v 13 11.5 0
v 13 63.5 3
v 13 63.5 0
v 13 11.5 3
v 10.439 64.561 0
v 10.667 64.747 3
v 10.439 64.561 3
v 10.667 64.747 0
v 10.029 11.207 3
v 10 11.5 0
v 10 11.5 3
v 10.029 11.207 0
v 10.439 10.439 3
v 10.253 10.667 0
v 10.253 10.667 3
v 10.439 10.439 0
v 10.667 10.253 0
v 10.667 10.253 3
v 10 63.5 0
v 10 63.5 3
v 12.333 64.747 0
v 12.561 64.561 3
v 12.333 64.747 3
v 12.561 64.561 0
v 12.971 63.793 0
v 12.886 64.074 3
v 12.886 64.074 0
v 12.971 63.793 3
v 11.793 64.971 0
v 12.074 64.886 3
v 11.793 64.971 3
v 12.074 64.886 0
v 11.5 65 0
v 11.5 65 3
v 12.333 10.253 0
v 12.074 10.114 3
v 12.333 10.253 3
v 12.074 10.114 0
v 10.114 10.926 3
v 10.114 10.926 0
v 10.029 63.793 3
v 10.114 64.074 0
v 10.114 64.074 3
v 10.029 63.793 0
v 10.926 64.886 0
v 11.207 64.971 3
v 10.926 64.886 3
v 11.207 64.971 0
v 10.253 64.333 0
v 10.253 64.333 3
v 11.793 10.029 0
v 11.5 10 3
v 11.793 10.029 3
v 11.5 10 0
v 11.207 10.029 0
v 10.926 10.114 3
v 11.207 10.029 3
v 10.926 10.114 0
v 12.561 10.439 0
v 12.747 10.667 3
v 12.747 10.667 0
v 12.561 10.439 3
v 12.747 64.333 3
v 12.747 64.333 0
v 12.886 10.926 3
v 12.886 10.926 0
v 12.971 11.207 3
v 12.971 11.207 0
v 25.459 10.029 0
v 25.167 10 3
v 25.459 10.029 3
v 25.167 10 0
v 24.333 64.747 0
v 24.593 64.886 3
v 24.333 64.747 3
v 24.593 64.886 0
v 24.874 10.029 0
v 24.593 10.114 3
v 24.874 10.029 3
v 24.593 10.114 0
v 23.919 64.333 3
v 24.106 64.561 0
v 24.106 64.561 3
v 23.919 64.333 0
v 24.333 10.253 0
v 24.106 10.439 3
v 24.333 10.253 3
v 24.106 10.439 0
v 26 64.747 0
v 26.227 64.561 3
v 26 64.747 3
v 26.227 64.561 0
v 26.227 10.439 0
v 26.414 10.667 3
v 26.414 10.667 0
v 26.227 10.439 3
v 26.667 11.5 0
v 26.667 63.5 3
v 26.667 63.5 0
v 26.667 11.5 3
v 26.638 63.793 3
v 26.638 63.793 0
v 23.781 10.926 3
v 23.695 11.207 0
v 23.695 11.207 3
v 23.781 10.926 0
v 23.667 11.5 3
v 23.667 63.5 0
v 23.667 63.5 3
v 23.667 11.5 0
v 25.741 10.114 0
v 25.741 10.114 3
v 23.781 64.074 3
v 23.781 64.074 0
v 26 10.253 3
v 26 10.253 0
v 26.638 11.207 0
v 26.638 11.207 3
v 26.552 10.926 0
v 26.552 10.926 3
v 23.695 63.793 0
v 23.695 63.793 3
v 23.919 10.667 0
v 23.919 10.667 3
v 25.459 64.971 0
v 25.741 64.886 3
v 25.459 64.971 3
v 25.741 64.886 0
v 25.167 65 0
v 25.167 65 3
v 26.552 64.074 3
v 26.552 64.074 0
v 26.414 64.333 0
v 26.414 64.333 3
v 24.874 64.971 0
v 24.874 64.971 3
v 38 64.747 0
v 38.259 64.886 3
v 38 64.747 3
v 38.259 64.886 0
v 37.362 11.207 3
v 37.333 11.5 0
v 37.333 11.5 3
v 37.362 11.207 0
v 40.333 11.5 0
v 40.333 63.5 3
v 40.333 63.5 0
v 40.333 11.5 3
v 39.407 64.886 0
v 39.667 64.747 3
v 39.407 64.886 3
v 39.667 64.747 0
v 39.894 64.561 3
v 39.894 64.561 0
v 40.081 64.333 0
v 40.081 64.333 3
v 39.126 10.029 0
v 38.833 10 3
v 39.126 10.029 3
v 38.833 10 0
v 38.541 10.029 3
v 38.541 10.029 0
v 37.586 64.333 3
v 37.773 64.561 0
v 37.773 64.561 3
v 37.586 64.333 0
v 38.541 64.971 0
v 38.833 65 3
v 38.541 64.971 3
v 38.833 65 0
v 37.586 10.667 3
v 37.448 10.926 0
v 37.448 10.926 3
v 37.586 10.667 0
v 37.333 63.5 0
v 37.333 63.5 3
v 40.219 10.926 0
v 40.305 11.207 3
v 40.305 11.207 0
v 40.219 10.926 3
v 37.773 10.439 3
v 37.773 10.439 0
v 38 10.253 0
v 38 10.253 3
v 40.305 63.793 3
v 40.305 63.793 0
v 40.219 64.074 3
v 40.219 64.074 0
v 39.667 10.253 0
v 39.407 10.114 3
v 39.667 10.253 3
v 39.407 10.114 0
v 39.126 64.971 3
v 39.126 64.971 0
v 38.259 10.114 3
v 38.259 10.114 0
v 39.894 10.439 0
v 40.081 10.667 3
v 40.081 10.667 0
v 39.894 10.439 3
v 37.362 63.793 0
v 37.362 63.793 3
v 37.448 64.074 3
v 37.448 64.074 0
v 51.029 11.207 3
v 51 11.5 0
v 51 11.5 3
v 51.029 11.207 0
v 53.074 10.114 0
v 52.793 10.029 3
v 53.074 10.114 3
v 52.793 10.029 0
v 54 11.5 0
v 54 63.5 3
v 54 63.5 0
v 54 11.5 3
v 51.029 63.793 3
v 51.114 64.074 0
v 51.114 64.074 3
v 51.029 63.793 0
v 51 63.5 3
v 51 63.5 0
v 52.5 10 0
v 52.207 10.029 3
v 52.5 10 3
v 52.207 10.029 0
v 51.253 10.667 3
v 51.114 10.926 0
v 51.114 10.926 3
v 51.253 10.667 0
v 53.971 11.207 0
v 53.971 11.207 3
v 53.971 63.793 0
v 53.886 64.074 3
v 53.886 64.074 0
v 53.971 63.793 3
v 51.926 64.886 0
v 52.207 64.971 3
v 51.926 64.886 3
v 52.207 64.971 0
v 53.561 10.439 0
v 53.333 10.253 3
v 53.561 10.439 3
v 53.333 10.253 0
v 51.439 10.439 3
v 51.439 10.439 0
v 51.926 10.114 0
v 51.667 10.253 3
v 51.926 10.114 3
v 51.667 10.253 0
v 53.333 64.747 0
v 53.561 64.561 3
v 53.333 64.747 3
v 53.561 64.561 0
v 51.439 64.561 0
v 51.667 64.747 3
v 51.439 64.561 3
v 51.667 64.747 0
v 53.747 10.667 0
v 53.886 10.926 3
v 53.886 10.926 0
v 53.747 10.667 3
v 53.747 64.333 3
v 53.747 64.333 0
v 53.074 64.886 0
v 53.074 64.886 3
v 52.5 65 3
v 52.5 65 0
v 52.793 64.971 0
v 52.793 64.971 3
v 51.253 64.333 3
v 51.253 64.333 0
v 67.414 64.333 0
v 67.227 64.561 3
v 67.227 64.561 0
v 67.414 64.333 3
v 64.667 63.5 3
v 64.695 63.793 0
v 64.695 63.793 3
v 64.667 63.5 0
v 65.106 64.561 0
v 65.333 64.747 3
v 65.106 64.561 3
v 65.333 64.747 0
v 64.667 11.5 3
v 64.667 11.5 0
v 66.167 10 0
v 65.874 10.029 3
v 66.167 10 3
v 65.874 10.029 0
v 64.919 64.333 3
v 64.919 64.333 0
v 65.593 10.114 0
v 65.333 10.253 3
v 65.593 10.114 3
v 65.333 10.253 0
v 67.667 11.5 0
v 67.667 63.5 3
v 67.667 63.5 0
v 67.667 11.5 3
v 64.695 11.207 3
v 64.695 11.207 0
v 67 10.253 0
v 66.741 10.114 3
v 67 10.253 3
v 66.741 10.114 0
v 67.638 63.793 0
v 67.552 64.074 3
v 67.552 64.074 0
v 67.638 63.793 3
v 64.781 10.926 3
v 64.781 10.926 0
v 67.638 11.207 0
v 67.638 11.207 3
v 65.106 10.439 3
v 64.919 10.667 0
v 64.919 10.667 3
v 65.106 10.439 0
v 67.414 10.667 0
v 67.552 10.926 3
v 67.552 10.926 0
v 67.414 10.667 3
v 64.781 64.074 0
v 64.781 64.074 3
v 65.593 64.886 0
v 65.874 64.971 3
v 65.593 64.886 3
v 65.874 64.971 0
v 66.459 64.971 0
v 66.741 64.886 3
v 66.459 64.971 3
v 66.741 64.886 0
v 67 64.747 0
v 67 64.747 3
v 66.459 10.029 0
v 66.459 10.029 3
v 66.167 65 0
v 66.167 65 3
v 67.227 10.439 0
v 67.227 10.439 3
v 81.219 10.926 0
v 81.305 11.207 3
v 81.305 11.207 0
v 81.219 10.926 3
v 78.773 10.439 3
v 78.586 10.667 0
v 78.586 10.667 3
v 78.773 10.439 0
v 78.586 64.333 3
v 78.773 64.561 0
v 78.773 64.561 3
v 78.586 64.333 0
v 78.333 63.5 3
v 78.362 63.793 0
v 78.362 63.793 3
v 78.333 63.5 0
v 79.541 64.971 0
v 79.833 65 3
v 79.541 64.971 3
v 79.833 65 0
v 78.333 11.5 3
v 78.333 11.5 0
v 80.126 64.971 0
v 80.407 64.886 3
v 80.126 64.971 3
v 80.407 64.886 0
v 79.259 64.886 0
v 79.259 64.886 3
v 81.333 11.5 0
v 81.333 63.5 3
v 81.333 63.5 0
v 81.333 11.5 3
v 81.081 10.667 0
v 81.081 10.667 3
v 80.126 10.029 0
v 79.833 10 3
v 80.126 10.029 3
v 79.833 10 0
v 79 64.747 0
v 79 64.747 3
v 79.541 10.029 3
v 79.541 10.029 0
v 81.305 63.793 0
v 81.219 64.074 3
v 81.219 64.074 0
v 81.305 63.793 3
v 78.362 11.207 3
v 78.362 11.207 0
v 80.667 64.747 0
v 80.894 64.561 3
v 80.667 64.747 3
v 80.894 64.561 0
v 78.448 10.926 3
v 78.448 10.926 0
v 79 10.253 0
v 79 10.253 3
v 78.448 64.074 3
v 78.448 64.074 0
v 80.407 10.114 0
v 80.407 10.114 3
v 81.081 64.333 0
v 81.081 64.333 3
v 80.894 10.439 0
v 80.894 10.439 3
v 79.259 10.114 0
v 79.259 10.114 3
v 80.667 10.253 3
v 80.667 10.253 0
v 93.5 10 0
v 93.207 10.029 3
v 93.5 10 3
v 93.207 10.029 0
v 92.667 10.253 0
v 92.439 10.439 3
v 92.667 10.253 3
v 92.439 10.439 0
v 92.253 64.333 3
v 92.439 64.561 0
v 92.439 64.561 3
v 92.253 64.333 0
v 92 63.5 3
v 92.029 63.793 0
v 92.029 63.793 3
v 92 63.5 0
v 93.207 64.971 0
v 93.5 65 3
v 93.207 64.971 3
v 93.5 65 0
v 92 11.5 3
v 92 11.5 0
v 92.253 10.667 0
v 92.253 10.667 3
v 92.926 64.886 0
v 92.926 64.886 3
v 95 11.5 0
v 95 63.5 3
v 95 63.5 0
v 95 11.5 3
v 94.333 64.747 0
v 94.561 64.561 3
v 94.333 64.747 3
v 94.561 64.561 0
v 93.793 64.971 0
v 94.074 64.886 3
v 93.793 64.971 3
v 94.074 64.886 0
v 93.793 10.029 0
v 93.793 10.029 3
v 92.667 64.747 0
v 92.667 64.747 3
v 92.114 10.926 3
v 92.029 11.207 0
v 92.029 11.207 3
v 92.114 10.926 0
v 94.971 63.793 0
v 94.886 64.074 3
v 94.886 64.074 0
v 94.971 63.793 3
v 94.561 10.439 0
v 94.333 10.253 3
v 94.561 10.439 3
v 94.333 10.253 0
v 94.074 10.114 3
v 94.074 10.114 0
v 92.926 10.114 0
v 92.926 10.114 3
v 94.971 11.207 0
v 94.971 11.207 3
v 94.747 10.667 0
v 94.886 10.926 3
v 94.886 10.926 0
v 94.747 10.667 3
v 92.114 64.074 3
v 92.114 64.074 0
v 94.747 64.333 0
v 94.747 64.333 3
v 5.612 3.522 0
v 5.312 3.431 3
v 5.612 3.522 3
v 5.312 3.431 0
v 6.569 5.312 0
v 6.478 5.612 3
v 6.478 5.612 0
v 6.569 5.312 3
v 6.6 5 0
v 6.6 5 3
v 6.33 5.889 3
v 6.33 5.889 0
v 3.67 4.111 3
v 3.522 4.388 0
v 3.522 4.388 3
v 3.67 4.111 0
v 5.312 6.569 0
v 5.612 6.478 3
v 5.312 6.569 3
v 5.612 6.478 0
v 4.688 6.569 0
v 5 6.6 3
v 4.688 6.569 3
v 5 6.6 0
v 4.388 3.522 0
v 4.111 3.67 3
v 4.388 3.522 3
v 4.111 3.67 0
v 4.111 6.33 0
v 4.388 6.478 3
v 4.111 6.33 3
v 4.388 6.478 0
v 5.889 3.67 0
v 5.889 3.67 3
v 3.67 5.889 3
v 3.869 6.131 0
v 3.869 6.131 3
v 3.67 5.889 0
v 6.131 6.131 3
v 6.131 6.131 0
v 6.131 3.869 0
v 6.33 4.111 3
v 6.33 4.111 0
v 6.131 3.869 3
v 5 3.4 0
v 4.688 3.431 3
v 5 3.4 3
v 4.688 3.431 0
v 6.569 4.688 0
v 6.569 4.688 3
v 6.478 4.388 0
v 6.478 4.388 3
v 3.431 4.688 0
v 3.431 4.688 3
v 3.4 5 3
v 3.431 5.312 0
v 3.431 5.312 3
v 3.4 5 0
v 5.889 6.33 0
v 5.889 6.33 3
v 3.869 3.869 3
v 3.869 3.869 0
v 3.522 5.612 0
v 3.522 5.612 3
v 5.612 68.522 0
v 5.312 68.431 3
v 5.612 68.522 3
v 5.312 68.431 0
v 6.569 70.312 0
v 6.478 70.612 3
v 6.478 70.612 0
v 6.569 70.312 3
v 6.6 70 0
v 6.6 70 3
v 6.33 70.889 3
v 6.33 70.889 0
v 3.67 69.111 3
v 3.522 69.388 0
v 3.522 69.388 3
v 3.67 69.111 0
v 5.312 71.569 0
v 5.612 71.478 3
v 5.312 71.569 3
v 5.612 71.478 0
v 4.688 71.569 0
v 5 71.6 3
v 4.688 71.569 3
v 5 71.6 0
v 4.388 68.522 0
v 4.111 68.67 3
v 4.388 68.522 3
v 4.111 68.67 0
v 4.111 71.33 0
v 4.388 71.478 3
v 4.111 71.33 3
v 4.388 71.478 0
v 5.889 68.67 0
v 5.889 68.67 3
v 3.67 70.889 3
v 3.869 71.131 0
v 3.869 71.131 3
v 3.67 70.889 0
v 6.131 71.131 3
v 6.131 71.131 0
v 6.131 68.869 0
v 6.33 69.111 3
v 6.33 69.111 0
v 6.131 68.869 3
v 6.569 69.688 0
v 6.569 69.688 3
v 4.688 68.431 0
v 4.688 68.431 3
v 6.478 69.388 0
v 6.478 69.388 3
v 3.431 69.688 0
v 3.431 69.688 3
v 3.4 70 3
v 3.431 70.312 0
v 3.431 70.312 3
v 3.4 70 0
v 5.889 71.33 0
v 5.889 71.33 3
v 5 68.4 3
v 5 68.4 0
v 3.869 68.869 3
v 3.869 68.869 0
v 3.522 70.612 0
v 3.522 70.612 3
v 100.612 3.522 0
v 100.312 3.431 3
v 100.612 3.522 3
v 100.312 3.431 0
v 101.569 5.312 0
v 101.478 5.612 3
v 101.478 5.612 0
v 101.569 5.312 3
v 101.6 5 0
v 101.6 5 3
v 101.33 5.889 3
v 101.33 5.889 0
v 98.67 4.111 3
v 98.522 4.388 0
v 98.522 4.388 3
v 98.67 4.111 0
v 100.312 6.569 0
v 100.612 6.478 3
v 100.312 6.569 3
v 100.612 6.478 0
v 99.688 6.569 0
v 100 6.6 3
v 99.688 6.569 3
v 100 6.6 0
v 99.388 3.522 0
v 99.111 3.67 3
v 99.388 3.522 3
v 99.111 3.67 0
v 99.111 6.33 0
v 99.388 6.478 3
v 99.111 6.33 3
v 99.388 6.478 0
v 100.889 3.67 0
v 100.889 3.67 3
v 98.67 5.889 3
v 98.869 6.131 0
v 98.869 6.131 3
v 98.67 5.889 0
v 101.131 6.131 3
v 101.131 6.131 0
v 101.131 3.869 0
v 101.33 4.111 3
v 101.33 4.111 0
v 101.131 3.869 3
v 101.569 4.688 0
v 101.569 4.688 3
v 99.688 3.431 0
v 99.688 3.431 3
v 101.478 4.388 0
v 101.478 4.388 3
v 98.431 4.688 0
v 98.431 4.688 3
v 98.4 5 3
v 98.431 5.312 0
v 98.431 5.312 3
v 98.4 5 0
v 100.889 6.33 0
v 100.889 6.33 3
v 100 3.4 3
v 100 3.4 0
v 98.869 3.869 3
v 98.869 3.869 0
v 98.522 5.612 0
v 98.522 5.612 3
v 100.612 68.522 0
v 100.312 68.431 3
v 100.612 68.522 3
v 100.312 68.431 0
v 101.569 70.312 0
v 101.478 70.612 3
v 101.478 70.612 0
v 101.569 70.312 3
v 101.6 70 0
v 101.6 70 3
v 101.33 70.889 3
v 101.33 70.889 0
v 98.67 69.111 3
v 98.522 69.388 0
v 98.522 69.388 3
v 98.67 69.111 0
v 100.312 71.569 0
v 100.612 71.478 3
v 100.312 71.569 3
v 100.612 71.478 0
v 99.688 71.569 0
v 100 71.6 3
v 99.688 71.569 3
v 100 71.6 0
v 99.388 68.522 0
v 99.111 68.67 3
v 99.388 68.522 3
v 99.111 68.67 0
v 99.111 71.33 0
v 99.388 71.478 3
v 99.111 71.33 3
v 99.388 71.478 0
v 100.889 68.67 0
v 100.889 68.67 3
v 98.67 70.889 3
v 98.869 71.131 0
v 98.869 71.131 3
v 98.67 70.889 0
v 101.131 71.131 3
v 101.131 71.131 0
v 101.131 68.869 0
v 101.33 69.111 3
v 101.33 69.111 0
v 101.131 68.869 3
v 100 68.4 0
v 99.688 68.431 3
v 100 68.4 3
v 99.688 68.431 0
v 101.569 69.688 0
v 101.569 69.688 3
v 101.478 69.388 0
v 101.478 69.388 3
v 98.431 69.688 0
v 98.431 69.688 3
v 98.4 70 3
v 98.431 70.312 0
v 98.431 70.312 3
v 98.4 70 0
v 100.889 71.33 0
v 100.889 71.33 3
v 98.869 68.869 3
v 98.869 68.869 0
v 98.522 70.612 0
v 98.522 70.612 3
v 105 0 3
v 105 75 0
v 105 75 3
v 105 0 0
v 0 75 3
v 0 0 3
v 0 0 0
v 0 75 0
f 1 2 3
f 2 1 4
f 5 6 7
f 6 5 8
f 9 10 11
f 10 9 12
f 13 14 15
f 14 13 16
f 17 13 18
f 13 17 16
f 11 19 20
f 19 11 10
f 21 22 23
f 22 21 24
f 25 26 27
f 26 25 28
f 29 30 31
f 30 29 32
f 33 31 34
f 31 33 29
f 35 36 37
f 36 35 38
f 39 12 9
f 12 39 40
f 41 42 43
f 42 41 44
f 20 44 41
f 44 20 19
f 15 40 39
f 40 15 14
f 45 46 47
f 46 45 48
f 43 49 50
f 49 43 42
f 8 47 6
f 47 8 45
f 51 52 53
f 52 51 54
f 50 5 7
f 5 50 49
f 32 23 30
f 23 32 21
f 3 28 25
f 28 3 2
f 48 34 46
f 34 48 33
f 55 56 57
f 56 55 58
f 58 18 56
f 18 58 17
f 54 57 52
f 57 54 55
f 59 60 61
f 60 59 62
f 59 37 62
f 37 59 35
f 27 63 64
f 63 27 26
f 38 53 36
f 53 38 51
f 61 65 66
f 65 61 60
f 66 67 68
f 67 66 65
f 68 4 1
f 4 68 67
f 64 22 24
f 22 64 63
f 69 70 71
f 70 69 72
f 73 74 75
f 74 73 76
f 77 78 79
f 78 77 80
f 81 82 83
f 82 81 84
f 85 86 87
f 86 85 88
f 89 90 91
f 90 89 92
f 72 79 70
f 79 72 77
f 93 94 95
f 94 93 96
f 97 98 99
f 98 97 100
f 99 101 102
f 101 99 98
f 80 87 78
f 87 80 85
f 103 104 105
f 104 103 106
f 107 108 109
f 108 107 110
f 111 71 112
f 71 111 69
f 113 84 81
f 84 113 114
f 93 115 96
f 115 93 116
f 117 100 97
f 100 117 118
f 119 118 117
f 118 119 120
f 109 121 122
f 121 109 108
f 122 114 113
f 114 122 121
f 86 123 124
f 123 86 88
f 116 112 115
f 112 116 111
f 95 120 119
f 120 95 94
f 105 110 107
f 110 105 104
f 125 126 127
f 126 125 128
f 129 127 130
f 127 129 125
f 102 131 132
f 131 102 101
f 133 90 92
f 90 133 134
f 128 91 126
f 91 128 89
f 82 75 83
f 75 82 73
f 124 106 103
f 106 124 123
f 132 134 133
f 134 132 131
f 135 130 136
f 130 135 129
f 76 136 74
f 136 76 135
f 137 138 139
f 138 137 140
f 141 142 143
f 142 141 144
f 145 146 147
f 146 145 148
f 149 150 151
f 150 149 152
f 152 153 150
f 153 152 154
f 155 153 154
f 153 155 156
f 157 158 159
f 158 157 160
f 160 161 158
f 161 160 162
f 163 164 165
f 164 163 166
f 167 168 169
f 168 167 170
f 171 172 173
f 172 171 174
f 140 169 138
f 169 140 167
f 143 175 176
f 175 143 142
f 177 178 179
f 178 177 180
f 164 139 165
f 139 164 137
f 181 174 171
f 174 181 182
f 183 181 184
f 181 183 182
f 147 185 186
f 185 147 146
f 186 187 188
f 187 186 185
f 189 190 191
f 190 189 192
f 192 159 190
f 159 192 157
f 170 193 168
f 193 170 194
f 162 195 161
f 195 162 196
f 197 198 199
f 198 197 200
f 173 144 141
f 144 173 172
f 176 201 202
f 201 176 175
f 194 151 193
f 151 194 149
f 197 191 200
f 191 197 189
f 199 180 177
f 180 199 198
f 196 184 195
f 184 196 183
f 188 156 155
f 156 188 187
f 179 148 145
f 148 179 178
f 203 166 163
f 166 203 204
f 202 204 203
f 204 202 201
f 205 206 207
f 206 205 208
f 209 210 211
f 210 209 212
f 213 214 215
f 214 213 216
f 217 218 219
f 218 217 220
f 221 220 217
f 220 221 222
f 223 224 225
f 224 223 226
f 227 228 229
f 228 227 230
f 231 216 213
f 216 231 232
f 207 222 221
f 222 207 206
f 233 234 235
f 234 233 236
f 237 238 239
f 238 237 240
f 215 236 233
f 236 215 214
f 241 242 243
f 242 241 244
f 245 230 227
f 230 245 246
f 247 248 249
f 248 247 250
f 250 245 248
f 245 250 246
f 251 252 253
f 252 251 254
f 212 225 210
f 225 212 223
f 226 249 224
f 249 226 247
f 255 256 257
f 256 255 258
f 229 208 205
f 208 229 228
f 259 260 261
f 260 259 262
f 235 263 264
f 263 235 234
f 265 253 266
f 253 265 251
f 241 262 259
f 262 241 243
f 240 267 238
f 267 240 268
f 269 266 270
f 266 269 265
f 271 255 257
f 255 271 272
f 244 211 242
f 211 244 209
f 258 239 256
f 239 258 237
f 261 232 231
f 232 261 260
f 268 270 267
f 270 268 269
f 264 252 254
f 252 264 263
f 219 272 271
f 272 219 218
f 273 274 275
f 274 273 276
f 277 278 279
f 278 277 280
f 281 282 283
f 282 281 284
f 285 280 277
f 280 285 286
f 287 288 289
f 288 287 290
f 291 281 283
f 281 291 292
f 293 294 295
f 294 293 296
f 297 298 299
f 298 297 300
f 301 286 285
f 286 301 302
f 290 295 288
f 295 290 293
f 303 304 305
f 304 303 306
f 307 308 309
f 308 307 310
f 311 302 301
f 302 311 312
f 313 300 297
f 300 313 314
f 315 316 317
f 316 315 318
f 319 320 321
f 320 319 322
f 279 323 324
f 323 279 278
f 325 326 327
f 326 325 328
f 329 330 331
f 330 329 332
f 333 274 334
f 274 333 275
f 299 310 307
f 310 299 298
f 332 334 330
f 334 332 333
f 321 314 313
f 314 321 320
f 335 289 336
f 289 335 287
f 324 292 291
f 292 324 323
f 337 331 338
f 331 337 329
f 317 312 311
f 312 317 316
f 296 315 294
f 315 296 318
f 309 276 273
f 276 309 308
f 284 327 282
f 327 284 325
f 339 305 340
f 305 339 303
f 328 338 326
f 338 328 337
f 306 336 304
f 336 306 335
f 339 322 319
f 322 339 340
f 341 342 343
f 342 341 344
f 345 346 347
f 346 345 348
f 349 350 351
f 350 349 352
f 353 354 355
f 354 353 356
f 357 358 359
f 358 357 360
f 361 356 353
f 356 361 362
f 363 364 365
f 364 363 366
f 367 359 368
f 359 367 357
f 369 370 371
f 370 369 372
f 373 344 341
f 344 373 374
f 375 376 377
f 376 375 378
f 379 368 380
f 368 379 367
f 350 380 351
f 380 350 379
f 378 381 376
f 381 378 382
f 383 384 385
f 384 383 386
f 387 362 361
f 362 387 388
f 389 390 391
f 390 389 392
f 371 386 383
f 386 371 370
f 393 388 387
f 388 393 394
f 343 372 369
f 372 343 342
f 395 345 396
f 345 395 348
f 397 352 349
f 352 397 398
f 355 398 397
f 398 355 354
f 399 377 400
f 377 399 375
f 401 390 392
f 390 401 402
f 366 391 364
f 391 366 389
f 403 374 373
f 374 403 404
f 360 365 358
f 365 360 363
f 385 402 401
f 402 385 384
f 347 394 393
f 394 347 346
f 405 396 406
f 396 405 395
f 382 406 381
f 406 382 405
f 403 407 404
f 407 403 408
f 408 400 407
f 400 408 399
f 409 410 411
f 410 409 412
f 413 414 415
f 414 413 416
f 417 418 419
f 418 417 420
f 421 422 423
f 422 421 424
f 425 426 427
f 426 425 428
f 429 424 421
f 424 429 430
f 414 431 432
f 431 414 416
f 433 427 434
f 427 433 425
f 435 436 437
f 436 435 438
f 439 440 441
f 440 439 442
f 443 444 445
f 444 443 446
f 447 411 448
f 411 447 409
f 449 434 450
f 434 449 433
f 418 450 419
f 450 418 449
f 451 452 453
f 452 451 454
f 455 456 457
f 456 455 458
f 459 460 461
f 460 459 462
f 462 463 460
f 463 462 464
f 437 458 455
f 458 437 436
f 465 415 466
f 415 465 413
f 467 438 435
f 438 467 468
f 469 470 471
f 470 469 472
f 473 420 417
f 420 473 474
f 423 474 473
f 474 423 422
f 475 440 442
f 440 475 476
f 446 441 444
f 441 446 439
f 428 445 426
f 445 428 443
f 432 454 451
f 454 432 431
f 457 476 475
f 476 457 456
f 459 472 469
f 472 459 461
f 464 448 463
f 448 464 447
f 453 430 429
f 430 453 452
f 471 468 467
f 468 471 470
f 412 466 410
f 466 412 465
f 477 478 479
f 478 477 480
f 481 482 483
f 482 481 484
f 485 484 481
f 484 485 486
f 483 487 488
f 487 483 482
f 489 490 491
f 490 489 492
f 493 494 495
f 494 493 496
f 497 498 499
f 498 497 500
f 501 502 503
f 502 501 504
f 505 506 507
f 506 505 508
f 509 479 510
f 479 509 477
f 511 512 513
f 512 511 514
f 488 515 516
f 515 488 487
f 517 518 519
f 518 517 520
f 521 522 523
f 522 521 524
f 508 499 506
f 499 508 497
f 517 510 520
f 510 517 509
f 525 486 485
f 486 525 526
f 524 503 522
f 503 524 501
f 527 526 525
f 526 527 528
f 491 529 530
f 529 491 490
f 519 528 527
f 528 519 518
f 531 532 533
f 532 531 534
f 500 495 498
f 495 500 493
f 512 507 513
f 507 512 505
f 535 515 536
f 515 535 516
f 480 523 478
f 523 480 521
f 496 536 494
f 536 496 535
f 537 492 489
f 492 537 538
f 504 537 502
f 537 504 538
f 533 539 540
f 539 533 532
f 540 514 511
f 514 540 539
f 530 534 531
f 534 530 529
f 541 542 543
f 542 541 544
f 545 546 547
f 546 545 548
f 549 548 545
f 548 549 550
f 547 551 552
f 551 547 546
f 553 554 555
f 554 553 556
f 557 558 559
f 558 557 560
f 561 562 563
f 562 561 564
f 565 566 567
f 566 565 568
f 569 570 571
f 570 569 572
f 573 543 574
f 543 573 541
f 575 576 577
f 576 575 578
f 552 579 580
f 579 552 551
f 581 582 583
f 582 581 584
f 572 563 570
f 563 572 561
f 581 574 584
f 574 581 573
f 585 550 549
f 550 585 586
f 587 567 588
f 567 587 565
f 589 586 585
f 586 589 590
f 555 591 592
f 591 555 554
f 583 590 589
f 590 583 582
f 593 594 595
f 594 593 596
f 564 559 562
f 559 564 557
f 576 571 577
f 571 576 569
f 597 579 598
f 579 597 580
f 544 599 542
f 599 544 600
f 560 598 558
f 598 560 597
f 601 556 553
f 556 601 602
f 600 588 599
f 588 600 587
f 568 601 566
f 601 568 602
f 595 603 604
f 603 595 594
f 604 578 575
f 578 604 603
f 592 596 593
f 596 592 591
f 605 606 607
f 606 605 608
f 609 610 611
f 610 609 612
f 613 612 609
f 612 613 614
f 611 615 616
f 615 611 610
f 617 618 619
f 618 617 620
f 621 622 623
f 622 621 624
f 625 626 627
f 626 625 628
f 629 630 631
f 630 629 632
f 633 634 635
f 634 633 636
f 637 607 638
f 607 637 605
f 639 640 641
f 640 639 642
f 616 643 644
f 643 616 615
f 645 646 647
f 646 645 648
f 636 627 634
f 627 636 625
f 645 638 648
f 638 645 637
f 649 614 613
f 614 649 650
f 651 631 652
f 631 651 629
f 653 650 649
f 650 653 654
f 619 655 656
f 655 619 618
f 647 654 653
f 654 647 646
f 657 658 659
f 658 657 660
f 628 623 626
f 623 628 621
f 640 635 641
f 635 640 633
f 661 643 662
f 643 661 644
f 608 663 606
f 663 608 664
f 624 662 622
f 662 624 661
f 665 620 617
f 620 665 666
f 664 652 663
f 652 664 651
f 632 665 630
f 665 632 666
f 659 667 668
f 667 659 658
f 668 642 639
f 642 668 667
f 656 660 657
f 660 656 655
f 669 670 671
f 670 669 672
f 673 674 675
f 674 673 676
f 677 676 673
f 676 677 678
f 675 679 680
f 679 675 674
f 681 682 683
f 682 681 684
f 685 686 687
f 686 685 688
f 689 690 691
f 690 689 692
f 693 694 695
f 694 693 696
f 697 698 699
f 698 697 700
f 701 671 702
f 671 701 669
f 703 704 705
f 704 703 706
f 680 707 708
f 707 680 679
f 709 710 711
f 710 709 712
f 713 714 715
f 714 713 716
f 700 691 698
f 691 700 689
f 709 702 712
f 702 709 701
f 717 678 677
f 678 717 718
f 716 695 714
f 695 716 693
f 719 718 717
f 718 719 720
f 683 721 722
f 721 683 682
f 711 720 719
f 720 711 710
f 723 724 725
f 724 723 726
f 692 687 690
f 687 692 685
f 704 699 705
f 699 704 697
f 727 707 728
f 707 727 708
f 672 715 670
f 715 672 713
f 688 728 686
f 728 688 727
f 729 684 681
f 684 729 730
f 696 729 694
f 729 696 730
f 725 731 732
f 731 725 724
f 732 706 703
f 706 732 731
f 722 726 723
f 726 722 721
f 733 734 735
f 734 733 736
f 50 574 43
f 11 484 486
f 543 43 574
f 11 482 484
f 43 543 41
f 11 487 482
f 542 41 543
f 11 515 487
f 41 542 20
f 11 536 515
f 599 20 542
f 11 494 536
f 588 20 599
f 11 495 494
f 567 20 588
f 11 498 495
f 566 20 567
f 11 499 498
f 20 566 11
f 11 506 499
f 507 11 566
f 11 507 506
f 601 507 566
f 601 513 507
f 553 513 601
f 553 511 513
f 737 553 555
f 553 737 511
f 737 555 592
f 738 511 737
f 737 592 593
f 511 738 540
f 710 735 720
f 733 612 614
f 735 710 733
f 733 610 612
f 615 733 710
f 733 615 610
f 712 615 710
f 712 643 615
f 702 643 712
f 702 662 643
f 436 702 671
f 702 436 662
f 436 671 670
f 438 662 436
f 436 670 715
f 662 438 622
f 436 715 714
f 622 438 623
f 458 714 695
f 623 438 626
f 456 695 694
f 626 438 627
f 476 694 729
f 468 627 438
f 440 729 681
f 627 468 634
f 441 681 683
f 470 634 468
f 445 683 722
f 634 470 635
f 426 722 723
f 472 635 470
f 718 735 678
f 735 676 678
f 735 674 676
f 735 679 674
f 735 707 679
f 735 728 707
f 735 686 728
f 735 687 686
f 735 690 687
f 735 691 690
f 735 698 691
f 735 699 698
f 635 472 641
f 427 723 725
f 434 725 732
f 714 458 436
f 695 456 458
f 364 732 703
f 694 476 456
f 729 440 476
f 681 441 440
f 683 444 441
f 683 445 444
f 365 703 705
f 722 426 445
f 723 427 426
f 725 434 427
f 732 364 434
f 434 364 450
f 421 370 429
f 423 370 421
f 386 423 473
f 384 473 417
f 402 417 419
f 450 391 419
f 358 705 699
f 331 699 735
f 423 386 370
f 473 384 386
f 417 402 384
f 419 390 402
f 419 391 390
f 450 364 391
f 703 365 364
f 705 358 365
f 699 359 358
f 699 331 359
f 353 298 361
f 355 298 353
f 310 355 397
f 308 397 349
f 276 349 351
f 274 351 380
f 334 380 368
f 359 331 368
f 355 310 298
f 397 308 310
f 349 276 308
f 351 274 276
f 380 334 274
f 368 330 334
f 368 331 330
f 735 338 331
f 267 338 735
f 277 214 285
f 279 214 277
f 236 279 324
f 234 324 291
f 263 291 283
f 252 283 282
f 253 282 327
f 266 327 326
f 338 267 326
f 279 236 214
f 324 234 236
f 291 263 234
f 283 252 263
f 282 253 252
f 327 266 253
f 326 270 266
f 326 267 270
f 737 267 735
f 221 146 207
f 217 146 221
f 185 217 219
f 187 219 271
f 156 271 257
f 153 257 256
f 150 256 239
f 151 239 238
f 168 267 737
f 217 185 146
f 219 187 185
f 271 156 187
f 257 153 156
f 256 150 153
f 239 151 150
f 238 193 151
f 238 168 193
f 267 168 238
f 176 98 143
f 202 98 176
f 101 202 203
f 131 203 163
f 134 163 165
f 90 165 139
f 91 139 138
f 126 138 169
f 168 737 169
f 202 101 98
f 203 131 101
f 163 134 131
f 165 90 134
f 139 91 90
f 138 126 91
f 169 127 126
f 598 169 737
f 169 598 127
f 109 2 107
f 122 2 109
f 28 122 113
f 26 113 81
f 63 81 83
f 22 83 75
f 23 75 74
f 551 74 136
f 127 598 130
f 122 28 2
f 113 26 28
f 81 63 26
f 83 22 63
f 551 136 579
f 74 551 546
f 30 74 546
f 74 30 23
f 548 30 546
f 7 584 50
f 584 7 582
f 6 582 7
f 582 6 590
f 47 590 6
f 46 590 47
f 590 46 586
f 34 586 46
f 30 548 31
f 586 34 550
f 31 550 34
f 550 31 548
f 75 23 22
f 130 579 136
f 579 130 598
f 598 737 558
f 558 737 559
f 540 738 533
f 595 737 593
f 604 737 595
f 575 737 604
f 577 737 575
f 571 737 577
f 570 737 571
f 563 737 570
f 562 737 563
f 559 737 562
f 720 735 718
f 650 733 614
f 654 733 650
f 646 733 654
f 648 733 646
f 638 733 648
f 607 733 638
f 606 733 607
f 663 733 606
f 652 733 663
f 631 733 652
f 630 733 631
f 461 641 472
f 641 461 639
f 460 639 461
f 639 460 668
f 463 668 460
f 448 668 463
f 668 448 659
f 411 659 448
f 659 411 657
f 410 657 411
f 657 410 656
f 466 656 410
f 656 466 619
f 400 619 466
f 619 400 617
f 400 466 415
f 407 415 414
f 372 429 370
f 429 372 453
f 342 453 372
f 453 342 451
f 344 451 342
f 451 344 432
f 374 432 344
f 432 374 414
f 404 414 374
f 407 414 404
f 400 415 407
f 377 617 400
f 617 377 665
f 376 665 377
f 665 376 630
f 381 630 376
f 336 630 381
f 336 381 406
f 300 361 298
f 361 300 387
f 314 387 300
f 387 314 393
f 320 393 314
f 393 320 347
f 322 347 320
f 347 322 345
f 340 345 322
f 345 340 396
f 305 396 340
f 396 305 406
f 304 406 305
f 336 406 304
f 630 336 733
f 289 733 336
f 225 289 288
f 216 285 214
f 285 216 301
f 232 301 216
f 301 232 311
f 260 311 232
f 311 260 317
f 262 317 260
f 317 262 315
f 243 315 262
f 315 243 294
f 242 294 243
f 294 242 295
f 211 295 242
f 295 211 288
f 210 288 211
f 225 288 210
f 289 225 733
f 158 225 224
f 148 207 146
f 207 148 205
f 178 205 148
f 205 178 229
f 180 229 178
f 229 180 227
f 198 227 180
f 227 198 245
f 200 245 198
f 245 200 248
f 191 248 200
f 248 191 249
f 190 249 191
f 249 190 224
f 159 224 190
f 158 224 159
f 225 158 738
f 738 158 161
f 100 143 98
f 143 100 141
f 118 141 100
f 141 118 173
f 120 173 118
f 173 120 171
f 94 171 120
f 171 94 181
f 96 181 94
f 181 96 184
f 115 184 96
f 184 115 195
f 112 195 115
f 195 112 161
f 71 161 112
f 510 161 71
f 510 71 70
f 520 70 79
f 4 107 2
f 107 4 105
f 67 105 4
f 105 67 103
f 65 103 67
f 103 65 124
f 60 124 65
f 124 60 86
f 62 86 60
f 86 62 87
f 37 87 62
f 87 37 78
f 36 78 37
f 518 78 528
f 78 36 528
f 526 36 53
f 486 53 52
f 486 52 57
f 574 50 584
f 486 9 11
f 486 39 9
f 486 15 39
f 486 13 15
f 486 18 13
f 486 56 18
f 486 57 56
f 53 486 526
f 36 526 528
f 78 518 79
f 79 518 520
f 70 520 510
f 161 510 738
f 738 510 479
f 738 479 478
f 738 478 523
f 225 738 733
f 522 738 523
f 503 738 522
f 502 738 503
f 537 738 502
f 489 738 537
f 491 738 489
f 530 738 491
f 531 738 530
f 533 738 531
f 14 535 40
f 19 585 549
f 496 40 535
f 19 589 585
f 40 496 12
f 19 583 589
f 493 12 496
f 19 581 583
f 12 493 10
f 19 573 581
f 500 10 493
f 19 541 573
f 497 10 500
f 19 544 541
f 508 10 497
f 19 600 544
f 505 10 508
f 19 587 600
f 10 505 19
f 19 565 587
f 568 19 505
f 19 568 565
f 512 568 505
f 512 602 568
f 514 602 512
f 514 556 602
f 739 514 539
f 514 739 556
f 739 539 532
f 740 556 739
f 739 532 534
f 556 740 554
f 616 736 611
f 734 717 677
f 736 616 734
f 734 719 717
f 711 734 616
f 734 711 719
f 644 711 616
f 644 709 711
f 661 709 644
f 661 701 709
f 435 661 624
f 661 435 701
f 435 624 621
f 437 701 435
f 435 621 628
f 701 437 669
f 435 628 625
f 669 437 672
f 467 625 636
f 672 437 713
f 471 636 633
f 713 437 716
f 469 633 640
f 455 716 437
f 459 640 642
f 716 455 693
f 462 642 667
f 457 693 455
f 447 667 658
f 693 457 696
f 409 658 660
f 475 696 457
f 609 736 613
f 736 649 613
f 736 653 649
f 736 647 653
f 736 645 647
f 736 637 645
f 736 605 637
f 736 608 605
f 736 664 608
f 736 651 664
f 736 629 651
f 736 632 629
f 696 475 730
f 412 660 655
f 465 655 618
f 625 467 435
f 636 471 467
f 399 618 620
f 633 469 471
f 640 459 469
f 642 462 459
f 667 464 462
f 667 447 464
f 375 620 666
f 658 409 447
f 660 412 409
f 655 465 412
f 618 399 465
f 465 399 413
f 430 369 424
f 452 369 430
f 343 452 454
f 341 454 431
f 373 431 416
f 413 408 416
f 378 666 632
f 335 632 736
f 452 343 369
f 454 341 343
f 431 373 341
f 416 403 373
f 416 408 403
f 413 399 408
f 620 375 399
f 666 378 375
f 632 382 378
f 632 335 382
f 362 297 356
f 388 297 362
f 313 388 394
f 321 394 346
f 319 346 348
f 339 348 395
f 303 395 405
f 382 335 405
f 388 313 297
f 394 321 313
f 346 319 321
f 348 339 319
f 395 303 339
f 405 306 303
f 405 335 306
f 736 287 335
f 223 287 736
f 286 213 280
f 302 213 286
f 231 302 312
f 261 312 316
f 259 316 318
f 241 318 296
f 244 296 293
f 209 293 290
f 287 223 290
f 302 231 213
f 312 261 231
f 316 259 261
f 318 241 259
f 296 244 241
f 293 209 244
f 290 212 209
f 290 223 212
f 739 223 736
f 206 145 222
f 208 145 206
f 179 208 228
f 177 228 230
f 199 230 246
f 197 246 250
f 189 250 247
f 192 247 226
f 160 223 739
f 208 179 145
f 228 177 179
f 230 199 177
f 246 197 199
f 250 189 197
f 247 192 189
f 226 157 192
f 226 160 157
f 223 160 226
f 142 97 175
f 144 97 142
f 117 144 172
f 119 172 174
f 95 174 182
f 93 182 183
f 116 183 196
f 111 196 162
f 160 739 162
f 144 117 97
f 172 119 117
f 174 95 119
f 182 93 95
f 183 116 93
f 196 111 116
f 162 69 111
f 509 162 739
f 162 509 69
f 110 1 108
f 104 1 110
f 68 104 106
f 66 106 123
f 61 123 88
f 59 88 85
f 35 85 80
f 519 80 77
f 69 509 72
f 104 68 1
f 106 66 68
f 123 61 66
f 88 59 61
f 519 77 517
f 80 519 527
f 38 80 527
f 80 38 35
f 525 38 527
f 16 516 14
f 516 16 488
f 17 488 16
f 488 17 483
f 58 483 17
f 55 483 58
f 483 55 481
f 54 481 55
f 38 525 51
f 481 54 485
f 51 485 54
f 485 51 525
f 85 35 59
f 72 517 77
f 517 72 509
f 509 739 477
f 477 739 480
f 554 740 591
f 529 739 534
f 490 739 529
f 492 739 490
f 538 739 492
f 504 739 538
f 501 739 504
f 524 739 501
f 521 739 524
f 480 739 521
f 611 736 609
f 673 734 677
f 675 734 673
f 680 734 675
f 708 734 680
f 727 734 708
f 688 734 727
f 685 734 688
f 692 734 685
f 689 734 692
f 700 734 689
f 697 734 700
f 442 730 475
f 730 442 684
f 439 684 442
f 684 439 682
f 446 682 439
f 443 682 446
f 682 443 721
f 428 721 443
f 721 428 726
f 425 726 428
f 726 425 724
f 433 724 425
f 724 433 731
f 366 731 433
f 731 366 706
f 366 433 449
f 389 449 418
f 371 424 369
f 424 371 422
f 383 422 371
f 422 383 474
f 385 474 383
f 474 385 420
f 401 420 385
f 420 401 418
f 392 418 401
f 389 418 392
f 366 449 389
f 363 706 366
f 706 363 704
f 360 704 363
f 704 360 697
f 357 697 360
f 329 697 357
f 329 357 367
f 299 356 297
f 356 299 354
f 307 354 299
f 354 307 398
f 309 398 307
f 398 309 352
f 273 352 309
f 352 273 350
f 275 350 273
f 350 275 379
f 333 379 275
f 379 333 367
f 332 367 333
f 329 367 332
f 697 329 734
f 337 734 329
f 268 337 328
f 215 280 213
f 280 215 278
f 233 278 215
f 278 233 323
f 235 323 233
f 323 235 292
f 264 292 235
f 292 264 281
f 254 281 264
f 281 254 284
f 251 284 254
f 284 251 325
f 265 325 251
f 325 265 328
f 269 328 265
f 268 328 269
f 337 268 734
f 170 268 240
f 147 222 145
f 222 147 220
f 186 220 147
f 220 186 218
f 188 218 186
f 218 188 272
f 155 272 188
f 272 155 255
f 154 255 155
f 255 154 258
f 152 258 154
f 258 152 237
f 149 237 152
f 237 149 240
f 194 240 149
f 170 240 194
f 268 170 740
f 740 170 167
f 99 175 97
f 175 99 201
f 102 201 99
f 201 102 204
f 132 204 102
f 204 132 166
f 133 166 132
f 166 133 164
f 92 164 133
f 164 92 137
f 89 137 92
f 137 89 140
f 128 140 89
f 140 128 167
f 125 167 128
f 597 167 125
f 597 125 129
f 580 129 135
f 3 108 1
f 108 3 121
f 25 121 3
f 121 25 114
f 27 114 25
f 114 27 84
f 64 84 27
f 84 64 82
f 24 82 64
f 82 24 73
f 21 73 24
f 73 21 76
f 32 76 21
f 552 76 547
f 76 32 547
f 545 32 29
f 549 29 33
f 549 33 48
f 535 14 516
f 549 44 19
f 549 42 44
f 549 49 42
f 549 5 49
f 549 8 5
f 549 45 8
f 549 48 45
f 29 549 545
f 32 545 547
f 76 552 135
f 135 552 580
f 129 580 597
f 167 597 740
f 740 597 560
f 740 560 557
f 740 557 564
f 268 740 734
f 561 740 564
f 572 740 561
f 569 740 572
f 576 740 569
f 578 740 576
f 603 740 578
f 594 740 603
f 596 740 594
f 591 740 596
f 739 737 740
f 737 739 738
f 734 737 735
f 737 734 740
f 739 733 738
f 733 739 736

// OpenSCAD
$fn = 32;
// Vented cover with a row of through slots.

width = 105;
depth = 75;
thickness = 3;
slot_w = 3;
slot_n = 7;
margin = 10;
pitch = (width - 2 * margin - slot_w) / (slot_n - 1);

difference() {
    cube([width, depth, thickness]);
    for (i = [0 : slot_n - 1])
        hull() {
            translate([margin + i * pitch + slot_w / 2, margin + slot_w / 2, -1])
                cylinder(h = thickness + 2, d = slot_w);
            translate([margin + i * pitch + slot_w / 2, depth - margin - slot_w / 2, -1])
                cylinder(h = thickness + 2, d = slot_w);
        }
    for (x = [margin / 2, width - margin / 2], y = [margin / 2, depth - margin / 2])
        translate([x, y, -1]) cylinder(h = thickness + 2, d = 3.2);
}
